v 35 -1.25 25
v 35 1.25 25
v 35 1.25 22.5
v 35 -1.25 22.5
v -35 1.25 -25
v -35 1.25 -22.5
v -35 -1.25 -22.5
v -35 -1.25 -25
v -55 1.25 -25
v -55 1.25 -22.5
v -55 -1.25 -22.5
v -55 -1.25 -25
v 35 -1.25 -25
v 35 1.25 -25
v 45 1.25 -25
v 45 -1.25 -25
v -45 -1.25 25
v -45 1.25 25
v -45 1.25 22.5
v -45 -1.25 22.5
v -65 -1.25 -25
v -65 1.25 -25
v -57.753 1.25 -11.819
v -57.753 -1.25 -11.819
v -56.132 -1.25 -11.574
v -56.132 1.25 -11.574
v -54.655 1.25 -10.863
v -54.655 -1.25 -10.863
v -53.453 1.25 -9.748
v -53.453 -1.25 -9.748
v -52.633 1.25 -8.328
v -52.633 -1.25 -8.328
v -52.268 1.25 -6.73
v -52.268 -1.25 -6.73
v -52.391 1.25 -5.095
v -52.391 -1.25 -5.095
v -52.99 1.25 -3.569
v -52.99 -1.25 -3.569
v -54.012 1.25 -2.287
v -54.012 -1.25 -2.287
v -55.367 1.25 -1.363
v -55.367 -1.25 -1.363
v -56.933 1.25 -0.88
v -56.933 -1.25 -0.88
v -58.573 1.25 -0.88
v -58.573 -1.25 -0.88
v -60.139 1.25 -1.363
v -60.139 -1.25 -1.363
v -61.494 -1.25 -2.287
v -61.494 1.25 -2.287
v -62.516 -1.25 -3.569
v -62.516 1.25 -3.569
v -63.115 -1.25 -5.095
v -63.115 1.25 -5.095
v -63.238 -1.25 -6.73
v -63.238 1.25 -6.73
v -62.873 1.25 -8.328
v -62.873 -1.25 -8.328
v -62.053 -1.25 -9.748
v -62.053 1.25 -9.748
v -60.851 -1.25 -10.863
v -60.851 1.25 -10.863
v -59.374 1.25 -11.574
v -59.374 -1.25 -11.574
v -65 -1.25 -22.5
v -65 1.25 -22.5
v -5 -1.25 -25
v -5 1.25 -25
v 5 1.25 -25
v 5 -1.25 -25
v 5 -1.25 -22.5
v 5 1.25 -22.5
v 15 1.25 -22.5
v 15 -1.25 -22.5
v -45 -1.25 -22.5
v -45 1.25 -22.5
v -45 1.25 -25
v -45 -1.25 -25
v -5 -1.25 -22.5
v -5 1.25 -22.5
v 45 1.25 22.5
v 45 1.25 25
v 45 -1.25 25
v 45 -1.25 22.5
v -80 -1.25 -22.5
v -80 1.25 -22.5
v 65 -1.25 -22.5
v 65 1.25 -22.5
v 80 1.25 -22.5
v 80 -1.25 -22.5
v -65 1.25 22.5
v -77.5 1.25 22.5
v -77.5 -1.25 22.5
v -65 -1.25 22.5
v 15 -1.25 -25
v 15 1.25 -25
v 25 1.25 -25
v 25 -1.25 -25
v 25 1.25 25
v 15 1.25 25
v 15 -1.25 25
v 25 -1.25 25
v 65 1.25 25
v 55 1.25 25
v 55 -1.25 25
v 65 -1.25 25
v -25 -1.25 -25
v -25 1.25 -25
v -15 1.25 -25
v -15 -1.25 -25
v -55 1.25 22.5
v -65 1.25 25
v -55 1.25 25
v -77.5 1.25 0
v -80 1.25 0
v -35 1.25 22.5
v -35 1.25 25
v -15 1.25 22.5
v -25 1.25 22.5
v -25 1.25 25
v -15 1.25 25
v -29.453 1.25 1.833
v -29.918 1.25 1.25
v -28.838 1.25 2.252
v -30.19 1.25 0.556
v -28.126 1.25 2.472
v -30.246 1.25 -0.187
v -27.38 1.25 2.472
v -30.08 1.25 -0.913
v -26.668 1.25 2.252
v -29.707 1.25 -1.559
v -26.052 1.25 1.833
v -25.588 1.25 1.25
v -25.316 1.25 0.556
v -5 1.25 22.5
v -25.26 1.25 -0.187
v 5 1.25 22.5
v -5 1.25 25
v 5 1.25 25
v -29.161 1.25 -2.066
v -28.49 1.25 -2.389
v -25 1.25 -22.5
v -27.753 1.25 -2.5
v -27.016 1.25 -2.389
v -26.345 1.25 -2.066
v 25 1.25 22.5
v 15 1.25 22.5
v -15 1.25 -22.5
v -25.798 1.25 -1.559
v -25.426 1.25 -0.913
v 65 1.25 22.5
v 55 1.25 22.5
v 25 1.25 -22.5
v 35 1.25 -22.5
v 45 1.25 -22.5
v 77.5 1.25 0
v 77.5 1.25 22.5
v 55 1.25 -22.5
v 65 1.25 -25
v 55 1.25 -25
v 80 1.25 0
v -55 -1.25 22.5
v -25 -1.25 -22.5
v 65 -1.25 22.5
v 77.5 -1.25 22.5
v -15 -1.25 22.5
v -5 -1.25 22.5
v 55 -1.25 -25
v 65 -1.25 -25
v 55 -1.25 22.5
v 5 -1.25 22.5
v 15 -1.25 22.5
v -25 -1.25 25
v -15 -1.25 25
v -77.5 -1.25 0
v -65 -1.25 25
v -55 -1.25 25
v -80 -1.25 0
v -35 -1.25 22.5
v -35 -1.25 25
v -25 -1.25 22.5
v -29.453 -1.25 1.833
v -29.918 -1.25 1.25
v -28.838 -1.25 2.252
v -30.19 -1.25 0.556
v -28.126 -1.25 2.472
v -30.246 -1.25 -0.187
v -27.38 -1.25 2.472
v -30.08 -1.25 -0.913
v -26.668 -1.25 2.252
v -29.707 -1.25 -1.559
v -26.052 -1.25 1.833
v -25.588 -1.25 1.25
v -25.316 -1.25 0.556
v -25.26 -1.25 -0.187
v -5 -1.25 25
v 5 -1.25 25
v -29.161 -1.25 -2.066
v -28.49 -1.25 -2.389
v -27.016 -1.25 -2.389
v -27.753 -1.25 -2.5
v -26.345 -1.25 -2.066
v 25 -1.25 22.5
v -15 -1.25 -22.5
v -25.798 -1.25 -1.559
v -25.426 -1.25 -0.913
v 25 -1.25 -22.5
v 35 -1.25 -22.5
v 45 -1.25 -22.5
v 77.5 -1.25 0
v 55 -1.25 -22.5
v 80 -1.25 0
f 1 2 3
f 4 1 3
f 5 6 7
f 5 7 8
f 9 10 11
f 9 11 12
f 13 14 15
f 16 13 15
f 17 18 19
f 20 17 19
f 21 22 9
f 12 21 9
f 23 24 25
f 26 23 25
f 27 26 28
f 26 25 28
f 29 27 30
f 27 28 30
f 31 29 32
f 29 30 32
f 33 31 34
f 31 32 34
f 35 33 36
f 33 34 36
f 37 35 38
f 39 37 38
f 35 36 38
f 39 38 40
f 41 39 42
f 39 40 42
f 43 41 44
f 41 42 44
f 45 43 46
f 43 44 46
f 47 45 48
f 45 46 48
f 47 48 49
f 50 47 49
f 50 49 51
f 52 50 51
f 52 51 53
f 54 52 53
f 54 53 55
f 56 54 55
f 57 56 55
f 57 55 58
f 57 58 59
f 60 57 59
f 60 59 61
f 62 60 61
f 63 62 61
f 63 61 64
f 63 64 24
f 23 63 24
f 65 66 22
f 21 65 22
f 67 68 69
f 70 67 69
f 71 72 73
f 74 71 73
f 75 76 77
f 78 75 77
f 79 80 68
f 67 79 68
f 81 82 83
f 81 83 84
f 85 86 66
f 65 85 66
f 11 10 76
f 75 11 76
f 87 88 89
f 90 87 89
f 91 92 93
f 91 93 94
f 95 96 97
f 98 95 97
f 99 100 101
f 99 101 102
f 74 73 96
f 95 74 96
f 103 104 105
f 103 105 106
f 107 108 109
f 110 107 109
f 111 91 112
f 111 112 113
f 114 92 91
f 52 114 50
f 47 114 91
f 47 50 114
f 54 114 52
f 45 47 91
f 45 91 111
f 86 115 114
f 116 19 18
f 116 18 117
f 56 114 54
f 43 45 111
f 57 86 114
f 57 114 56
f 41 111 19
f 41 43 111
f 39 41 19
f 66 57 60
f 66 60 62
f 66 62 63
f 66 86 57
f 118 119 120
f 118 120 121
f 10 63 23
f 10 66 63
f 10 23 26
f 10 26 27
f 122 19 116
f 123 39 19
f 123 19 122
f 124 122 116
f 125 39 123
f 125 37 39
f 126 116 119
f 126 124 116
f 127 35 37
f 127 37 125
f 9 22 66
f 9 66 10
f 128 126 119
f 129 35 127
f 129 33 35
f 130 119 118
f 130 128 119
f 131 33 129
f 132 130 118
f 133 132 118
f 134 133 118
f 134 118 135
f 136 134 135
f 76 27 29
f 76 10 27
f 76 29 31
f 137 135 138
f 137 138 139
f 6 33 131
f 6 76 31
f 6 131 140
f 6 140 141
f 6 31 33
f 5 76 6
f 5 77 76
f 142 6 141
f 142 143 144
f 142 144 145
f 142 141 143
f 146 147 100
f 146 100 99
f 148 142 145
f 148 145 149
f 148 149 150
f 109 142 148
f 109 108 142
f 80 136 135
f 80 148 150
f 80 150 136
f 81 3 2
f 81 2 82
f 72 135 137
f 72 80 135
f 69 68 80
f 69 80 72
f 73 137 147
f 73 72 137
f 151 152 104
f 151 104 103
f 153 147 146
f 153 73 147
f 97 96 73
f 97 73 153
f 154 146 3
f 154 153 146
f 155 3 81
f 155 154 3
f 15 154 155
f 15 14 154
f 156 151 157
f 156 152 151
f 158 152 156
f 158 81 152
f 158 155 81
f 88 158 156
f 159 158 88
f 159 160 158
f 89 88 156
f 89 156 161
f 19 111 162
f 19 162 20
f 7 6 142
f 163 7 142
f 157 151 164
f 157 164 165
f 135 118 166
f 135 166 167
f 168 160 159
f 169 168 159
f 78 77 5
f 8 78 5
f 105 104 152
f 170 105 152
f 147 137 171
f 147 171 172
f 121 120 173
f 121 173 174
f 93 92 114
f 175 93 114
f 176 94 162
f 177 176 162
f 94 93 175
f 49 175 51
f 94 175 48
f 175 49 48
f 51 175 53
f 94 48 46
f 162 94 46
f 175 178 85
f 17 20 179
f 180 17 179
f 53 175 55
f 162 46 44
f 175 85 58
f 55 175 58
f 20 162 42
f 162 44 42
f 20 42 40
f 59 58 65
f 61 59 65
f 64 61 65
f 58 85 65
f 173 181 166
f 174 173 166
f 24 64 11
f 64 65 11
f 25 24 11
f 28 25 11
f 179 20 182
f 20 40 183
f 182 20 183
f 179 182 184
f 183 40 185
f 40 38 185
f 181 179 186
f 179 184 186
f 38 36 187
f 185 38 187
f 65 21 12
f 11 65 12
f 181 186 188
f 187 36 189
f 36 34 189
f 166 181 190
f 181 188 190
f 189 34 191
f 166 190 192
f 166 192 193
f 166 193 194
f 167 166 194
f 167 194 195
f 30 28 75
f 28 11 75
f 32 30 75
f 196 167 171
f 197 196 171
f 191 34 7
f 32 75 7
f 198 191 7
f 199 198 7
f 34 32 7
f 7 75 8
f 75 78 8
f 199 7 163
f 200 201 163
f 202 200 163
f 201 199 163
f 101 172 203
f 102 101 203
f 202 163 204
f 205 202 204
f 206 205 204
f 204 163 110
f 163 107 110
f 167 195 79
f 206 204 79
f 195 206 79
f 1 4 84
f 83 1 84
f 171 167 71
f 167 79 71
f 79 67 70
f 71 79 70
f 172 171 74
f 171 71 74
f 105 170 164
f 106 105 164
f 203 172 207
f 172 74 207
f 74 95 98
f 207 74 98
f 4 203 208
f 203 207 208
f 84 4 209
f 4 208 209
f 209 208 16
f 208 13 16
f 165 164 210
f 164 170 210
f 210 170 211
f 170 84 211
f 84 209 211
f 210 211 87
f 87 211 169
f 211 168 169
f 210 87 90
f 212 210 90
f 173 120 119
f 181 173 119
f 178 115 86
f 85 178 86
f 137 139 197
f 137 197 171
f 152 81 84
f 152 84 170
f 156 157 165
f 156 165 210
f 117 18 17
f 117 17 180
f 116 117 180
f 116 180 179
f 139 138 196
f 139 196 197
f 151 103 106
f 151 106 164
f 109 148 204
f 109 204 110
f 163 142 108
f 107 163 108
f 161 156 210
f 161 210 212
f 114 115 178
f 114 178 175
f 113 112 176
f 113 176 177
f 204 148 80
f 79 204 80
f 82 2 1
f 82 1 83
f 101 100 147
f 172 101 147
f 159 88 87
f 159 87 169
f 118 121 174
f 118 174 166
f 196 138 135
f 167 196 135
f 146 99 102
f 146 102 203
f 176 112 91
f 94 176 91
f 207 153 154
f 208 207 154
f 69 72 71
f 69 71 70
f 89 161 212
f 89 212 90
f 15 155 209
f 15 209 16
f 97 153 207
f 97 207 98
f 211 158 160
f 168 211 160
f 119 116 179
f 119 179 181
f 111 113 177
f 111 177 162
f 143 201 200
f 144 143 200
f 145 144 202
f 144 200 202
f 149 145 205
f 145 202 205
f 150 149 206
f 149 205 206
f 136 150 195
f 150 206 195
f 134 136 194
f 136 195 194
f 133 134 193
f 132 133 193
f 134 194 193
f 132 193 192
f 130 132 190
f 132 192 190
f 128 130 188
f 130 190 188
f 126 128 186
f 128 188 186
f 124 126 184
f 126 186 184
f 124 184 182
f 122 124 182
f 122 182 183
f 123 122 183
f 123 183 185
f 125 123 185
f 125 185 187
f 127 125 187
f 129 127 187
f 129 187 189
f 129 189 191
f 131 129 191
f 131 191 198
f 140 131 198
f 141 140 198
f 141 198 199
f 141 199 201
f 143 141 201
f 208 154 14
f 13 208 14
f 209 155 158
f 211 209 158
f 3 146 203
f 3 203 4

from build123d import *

# Parameters (mm, degrees)
SKETCH1_W           = 160
SKETCH1_H           = 50
BOSS_EXTRUDE1_DEPTH = 1.25
SKETCH2_W           = 10
SKETCH2_H           = 2.5
SKETCH2_W_2         = 15
CUT_EXTRUDE1_DEPTH  = 4
SKETCH3_W           = 2.5
SKETCH3_H           = 22.5
CUT_EXTRUDE2_DEPTH  = 84.852549156
CUT_EXTRUDE4_REACH  = 85.853
SKETCH4_R           = 5.5
SKETCH4_R_2         = 2.5


with BuildPart() as part:
    # Sketch1 → Boss-Extrude1 (new, symmetric)
    with BuildSketch(Plane(origin=(0, 0, 0), x_dir=(1, 0, 0), z_dir=(0, 1, 0))):
        Rectangle(SKETCH1_W, SKETCH1_H)
    extrude(amount=BOSS_EXTRUDE1_DEPTH, both=True)

    # Sketch2 → Cut-Extrude1 (cut)
    with BuildSketch(Plane(origin=(0, 1.25, 0), x_dir=(1, 0, 0), z_dir=(0, 1, 0))):
        with Locations((30, 23.75)):
            Rectangle(SKETCH2_W, SKETCH2_H)
        with Locations((10, 23.75)):
            Rectangle(SKETCH2_W, SKETCH2_H)
        with Locations((10, -23.75)):
            Rectangle(SKETCH2_W, SKETCH2_H)
        with Locations((30, -23.75)):
            Rectangle(SKETCH2_W, SKETCH2_H)
        with Locations((50, 23.75)):
            Rectangle(SKETCH2_W, SKETCH2_H)
        with Locations((50, -23.75)):
            Rectangle(SKETCH2_W, SKETCH2_H)
        with Locations((-10, 23.75)):
            Rectangle(SKETCH2_W, SKETCH2_H)
        with Locations((-10, -23.75)):
            Rectangle(SKETCH2_W, SKETCH2_H)
        with Locations((-30, 23.75)):
            Rectangle(SKETCH2_W, SKETCH2_H)
        with Locations((-30, -23.75)):
            Rectangle(SKETCH2_W, SKETCH2_H)
        with Locations((-50, 23.75)):
            Rectangle(SKETCH2_W, SKETCH2_H)
        with Locations((-50, -23.75)):
            Rectangle(SKETCH2_W, SKETCH2_H)
        with Locations((72.5, 23.75)):
            Rectangle(SKETCH2_W_2, SKETCH2_H)
        with Locations((72.5, -23.75)):
            Rectangle(SKETCH2_W_2, SKETCH2_H)
        with Locations((-72.5, 23.75)):
            Rectangle(SKETCH2_W_2, SKETCH2_H)
        with Locations((-72.5, -23.75)):
            Rectangle(SKETCH2_W_2, SKETCH2_H)
    extrude(amount=-CUT_EXTRUDE1_DEPTH, mode=Mode.SUBTRACT)

    # Sketch3 → Cut-Extrude2 (cut, through all)
    with BuildSketch(Plane(origin=(0, 1.25, 0), x_dir=(1, 0, 0), z_dir=(0, 1, 0))):
        with Locations((78.75, -11.25)):
            Rectangle(SKETCH3_W, SKETCH3_H)
        with Locations((-78.75, -11.25)):
            Rectangle(SKETCH3_W, SKETCH3_H)
    extrude(amount=-CUT_EXTRUDE2_DEPTH, mode=Mode.SUBTRACT)

    # Sketch4 → Cut-Extrude4 (cut, up to next)
    with BuildSketch(Plane.XZ.offset(1.25), mode=Mode.PRIVATE) as cut_extrude4_sk1:
        with Locations(Location((-57.7529076, -6.3187203, 0), (0, 0, 270))):
            Circle(SKETCH4_R)
    cut_extrude4_tool1 = extrude(cut_extrude4_sk1.sketch, amount=-CUT_EXTRUDE4_REACH, mode=Mode.PRIVATE) & part.part
    # Sketch4 → Cut-Extrude4 (cut, up to next)
    with BuildSketch(Plane.XZ.offset(1.25), mode=Mode.PRIVATE) as cut_extrude4_sk2:
        with Locations(Location((-27.7529076, 0, 0), (0, 0, 270))):
            Circle(SKETCH4_R_2)
    cut_extrude4_tool2 = extrude(cut_extrude4_sk2.sketch, amount=-CUT_EXTRUDE4_REACH, mode=Mode.PRIVATE) & part.part
    add(cut_extrude4_tool1.solids().sort_by_distance((-57.752908, -1.25, -6.31872))[0], mode=Mode.SUBTRACT)
    add(cut_extrude4_tool2.solids().sort_by_distance((-27.752908, -1.25, 0))[0], mode=Mode.SUBTRACT)


solid = part.part
